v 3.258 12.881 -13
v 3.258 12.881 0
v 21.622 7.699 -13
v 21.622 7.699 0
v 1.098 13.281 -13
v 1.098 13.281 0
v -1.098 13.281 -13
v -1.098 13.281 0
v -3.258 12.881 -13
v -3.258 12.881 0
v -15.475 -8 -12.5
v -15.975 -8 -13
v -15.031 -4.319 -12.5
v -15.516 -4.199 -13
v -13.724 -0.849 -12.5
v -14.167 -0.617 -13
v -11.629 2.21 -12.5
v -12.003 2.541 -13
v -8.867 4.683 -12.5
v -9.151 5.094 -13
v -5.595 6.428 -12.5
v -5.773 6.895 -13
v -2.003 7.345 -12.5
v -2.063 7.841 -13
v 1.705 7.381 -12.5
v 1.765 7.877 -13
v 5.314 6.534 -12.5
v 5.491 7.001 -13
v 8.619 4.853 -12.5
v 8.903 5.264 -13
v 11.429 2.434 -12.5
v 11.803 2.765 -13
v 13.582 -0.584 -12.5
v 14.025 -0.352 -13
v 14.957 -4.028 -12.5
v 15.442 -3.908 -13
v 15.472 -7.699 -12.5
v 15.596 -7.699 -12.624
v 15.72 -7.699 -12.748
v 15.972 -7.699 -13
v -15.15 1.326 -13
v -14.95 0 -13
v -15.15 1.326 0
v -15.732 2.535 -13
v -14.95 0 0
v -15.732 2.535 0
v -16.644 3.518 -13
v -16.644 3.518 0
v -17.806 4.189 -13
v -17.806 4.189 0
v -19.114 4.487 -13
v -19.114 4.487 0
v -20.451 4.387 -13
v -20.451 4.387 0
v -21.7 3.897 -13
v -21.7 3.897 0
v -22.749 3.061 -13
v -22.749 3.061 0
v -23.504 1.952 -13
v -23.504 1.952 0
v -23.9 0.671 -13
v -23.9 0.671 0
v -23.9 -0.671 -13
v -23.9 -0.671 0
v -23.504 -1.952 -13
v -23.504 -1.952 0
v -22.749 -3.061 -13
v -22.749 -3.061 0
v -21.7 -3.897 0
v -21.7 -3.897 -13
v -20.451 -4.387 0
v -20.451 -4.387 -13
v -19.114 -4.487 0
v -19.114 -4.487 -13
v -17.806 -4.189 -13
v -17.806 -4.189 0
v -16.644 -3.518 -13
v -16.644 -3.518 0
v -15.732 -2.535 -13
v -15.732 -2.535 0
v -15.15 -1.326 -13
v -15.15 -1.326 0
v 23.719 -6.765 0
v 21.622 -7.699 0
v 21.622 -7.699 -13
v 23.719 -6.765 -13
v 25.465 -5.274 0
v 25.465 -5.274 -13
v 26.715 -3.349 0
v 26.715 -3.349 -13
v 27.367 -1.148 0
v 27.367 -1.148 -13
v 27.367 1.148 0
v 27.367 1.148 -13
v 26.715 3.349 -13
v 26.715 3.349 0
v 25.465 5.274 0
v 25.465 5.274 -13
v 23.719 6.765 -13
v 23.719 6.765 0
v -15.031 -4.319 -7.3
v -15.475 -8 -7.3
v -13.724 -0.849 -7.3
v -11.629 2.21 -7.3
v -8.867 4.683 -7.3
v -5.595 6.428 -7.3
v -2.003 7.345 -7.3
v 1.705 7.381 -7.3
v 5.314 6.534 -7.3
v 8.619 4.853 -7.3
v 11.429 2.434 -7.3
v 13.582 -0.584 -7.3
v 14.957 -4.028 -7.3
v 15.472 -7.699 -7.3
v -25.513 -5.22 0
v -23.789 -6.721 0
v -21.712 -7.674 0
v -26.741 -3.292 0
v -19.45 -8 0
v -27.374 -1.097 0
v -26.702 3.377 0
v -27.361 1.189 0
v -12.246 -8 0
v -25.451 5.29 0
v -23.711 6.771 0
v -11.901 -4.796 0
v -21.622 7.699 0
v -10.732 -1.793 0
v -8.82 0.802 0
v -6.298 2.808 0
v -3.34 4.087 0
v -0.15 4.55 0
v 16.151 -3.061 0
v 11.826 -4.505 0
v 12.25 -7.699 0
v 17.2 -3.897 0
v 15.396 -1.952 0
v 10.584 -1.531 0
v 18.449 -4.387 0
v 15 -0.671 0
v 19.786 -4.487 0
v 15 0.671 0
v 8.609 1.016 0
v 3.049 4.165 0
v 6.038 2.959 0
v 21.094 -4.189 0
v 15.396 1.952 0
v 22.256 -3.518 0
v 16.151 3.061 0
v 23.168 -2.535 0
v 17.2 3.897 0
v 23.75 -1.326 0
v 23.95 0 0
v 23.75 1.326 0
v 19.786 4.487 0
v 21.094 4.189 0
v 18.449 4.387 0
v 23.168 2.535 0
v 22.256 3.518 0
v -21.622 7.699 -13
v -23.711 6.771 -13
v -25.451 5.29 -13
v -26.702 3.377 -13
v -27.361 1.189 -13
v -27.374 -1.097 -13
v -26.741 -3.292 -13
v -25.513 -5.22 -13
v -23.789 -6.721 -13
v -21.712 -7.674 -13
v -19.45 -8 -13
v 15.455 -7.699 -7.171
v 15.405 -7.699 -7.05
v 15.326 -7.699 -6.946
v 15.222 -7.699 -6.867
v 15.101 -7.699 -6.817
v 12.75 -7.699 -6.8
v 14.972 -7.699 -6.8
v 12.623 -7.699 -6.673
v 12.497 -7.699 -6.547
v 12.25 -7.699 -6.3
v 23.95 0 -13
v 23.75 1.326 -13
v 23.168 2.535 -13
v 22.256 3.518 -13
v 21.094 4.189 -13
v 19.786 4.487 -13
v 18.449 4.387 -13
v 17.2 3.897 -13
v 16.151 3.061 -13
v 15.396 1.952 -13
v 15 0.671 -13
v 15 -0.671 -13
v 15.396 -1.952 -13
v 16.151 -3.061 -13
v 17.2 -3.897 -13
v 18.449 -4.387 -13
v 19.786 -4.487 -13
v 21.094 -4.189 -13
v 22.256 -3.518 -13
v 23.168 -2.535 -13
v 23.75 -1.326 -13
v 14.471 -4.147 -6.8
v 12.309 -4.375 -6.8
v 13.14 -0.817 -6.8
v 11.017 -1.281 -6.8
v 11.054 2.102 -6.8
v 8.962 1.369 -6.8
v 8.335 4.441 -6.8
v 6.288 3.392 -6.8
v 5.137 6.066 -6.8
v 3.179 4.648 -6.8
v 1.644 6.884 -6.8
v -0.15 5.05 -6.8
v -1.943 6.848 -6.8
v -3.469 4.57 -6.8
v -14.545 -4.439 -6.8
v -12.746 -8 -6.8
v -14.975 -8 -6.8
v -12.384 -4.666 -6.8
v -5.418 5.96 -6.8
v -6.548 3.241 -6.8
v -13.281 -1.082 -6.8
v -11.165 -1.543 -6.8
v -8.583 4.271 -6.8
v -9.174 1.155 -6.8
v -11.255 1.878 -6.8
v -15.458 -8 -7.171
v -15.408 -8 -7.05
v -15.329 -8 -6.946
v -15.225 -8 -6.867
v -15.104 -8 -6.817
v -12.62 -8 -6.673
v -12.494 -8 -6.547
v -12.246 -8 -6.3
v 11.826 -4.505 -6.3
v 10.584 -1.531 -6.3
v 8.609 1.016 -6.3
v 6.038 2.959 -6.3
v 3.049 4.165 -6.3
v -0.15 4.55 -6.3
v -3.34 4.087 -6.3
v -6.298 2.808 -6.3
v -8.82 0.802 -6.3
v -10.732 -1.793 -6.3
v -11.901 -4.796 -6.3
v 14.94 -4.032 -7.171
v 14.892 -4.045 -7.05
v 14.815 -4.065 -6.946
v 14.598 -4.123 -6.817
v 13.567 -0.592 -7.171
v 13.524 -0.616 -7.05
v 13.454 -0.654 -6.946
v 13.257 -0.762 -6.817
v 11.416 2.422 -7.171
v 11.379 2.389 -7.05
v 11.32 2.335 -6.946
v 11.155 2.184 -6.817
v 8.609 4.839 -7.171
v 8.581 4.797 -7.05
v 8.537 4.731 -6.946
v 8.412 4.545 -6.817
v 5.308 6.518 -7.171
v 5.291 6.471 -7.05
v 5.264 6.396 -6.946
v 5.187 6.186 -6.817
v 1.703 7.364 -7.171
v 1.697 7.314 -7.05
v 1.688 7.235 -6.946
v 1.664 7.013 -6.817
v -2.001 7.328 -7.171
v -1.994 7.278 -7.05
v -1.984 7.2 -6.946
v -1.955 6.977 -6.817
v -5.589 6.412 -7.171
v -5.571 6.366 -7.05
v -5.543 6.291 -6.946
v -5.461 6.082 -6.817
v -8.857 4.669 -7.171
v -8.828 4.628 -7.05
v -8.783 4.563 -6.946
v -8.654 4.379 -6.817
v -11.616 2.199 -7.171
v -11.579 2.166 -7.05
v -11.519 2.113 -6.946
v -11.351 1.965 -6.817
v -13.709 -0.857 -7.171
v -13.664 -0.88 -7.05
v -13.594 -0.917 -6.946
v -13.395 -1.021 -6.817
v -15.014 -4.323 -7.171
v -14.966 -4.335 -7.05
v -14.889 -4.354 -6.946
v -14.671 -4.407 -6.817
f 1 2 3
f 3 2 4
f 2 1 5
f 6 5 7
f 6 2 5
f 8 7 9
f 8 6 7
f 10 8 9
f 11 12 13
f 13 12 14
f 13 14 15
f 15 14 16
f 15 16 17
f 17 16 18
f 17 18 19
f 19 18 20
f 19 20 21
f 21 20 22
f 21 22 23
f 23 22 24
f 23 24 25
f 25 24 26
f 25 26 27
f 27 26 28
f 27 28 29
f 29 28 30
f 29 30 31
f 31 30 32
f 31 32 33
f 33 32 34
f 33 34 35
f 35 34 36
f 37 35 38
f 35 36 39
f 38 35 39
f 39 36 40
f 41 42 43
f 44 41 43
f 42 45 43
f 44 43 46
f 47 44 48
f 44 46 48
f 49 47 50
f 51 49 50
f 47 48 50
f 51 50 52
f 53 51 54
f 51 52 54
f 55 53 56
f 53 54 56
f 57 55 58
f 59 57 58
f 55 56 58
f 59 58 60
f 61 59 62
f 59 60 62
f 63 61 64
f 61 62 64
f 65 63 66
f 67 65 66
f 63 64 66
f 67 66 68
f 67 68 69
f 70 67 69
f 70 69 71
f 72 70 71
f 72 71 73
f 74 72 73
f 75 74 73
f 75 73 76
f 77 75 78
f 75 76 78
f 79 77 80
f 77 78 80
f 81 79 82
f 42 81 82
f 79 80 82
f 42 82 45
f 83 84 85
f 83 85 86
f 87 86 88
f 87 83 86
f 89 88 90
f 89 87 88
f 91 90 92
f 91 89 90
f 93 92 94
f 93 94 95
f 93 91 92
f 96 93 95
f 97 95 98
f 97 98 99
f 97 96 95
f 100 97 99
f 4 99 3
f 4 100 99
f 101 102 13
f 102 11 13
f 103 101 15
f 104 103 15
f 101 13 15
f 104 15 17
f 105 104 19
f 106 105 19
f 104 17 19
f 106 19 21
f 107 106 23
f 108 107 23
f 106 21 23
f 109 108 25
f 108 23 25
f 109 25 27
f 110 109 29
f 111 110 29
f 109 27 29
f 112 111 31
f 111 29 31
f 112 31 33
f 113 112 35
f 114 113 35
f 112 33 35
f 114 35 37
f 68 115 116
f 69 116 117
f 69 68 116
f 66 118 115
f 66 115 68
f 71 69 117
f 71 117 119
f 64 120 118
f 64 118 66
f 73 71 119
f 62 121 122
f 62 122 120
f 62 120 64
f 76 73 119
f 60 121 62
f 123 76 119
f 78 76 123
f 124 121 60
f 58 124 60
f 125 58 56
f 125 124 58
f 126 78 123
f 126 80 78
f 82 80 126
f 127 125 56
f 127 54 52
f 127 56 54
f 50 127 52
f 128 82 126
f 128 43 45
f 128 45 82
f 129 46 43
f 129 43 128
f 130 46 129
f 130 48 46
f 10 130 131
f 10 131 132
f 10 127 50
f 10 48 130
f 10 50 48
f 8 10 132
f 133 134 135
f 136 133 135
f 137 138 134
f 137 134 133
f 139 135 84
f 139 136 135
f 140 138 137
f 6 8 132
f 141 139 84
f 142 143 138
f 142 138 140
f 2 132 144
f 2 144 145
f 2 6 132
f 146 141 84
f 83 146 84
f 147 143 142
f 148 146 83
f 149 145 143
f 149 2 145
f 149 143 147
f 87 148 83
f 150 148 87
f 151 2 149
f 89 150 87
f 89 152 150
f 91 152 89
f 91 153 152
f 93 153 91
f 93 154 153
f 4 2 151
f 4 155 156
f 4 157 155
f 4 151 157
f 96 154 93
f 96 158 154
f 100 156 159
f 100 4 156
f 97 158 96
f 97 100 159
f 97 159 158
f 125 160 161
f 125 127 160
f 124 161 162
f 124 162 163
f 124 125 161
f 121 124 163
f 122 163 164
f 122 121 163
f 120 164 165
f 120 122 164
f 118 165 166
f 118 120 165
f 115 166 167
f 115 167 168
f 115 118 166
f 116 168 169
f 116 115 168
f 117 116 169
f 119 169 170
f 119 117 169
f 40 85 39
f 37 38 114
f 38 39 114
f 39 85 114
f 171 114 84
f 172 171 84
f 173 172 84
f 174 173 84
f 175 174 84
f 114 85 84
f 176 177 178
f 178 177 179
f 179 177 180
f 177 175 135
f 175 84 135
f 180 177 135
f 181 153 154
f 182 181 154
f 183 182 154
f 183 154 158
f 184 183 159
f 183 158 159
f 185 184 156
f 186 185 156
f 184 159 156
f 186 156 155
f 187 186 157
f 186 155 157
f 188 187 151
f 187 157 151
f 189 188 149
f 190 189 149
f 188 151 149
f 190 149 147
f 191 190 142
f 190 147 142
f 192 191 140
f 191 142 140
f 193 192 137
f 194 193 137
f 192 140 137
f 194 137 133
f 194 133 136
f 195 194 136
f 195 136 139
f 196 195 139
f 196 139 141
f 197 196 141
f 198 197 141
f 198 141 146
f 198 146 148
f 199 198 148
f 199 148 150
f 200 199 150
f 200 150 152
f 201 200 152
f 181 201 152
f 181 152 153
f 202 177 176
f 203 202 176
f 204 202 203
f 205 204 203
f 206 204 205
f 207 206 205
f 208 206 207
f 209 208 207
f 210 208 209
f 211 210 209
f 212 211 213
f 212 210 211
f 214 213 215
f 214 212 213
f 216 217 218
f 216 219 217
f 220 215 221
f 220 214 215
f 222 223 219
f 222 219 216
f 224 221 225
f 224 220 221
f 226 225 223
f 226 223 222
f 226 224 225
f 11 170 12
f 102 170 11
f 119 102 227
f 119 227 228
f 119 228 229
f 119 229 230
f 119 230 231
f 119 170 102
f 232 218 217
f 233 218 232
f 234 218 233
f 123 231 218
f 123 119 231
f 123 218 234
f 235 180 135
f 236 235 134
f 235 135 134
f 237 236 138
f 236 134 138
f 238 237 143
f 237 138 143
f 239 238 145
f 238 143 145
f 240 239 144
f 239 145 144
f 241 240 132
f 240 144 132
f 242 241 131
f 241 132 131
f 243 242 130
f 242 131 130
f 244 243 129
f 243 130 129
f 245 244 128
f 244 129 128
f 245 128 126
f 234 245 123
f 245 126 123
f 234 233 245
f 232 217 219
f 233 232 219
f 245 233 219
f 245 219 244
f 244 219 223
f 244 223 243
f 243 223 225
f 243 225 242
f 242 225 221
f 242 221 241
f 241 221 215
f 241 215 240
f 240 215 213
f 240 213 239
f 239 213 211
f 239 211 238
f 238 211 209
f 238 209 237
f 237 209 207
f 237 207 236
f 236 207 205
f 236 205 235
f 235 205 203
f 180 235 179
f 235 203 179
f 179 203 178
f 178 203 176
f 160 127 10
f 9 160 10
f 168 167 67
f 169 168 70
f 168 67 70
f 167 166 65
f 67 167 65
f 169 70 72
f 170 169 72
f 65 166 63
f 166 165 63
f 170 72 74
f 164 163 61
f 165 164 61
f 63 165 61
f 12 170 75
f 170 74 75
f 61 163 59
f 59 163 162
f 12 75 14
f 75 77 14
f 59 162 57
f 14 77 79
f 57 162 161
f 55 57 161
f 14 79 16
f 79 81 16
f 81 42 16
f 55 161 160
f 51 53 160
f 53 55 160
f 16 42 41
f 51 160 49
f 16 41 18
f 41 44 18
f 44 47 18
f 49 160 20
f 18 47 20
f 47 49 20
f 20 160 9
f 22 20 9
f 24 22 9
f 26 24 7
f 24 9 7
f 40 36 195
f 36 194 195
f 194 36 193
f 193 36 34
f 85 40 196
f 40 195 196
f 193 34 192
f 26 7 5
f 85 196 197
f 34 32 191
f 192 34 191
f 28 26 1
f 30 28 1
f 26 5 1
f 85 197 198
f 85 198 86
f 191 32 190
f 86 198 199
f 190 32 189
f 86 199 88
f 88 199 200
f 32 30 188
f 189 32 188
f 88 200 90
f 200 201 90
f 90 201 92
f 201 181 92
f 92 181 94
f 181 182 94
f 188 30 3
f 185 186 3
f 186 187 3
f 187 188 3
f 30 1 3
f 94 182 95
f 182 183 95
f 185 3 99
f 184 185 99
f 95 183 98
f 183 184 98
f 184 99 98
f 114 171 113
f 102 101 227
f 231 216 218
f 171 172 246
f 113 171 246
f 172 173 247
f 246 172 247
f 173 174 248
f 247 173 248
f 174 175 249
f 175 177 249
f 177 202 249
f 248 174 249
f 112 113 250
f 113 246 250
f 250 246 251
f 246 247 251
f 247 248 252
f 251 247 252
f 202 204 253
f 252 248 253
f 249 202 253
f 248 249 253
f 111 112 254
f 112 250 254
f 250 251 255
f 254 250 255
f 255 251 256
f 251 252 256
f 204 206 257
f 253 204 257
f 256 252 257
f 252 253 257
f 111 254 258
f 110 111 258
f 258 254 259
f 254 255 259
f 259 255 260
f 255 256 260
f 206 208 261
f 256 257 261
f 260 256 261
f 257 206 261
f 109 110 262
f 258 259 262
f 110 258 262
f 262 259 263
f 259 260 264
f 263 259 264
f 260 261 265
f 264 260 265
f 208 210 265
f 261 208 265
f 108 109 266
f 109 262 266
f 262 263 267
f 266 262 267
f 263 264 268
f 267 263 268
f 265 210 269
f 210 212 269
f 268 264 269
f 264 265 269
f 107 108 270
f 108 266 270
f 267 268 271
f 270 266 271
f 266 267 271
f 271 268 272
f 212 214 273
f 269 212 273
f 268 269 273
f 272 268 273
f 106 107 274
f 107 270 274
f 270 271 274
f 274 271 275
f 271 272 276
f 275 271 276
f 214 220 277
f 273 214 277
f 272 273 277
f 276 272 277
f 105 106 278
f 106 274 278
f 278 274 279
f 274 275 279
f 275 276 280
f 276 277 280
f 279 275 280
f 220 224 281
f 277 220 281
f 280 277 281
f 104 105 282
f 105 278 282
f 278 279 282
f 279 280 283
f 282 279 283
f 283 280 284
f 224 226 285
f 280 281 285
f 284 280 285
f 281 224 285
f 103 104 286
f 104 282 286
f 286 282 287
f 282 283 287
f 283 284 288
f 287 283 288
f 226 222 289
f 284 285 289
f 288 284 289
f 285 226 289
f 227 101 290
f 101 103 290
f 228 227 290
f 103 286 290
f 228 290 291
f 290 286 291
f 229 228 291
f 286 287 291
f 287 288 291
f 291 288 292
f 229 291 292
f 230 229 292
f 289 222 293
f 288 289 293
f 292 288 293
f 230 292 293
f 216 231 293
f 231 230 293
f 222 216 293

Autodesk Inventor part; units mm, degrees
ref_plane "YZ Plane" through (0, 0, 0) normal (1, 0, 0) x (0, 1, 0)
ref_plane "XZ Plane" through (0, 0, 0) normal (0, 1, 0) x (-1, 0, 0)
ref_plane "XY Plane" through (0, 0, 0) normal (0, 0, 1) x (1, 0, 0)
sketch "Эскиз1" plane through (0, 0, 0) normal (0, 0, 1) x (1, 0, 0)
  line L0 (0, 18.7367) -> (0, -24.5413)
  arc A0 (21.6223, -7.6994) -> (21.6223, 7.6994) centre (19.45, 0) ccw
  line L1 (19.45, 0) -> (21.6223, -7.6994) construction
  line L2 (19.45, 0) -> (17.2777, 7.6994) construction
  arc A1 (-21.6223, 7.6994) -> (-19.45, -8) centre (-19.45, 0) ccw
  line L3 (-19.45, 0) -> (-19.45, 7.9959) construction
  line L4 (-19.45, 0) -> (-11.4541, 0) construction
  line L5 (-19.45, 0) -> (-19.45, -8) construction
  arc A2 (12.25, -7.6994) -> (-12.2463, -8) centre (0, -7.6994) ccw
  line L6 (-21.6223, 7.6994) -> (-3.2585, 12.8806)
  line L7 (3.2585, 12.8806) -> (21.6223, 7.6994)
  line L8 (21.6223, -7.6994) -> (12.25, -7.6994)
  line L9 (-19.45, -8) -> (-12.2463, -8)
  circle A3 centre (-19.45, 0) radius 4.5
  circle A4 centre (19.45, 0) radius 4.5
  arc A5 (3.2585, 12.8806) -> (-3.2585, 12.8806) centre (0, 1.3315) ccw
  point P0 (0, 0)
  point P1 (-27.45, 0)
  point P2 (27.45, 0)
  point P3 (0, 13.8)
  dimension "d0" = 8
  dimension "d1" = 180
  dimension "d3" = 8
  dimension "d4" = 90
  dimension "d5" = 180
  dimension "d6" = 24.5
  dimension "d7" = 54.9
  dimension "d9" = 21.8
  dimension "d10" = 9
  dimension "d11" = 9
  dimension "d12" = 12
extrude "Выдавливание1" add sketch "Эскиз1" against normal blind 13
sketch "Эскиз2" plane through (0, 0, -13) normal (0, 0, -1) x (-1, 0, 0)
  circle A0 centre (0, -8) radius 15.475
  point P0 (0, 0)
  point P1 (12.2463, -8)
  dimension "d15" = 30.95
extrude "Выдавливание2" cut sketch "Эскиз2" against normal blind 6.2
fillet "Сопряжение1" radius 0.5 1 edges at (-0.1503, 7.4743, -6.8)
chamfer "Фаска1" distance 0.5 angle 45 1 edges at (-0.1503, 7.4743, -13) measured on face at (-11.2492, 8.421, -13)
chamfer "Фаска2" distance 0.5 angle 45 1 edges at (-0.1503, 4.5497, -6.8) measured on face at (13.8976, -6.5154, -6.8)
properties part number "50073 Полуфланец"
